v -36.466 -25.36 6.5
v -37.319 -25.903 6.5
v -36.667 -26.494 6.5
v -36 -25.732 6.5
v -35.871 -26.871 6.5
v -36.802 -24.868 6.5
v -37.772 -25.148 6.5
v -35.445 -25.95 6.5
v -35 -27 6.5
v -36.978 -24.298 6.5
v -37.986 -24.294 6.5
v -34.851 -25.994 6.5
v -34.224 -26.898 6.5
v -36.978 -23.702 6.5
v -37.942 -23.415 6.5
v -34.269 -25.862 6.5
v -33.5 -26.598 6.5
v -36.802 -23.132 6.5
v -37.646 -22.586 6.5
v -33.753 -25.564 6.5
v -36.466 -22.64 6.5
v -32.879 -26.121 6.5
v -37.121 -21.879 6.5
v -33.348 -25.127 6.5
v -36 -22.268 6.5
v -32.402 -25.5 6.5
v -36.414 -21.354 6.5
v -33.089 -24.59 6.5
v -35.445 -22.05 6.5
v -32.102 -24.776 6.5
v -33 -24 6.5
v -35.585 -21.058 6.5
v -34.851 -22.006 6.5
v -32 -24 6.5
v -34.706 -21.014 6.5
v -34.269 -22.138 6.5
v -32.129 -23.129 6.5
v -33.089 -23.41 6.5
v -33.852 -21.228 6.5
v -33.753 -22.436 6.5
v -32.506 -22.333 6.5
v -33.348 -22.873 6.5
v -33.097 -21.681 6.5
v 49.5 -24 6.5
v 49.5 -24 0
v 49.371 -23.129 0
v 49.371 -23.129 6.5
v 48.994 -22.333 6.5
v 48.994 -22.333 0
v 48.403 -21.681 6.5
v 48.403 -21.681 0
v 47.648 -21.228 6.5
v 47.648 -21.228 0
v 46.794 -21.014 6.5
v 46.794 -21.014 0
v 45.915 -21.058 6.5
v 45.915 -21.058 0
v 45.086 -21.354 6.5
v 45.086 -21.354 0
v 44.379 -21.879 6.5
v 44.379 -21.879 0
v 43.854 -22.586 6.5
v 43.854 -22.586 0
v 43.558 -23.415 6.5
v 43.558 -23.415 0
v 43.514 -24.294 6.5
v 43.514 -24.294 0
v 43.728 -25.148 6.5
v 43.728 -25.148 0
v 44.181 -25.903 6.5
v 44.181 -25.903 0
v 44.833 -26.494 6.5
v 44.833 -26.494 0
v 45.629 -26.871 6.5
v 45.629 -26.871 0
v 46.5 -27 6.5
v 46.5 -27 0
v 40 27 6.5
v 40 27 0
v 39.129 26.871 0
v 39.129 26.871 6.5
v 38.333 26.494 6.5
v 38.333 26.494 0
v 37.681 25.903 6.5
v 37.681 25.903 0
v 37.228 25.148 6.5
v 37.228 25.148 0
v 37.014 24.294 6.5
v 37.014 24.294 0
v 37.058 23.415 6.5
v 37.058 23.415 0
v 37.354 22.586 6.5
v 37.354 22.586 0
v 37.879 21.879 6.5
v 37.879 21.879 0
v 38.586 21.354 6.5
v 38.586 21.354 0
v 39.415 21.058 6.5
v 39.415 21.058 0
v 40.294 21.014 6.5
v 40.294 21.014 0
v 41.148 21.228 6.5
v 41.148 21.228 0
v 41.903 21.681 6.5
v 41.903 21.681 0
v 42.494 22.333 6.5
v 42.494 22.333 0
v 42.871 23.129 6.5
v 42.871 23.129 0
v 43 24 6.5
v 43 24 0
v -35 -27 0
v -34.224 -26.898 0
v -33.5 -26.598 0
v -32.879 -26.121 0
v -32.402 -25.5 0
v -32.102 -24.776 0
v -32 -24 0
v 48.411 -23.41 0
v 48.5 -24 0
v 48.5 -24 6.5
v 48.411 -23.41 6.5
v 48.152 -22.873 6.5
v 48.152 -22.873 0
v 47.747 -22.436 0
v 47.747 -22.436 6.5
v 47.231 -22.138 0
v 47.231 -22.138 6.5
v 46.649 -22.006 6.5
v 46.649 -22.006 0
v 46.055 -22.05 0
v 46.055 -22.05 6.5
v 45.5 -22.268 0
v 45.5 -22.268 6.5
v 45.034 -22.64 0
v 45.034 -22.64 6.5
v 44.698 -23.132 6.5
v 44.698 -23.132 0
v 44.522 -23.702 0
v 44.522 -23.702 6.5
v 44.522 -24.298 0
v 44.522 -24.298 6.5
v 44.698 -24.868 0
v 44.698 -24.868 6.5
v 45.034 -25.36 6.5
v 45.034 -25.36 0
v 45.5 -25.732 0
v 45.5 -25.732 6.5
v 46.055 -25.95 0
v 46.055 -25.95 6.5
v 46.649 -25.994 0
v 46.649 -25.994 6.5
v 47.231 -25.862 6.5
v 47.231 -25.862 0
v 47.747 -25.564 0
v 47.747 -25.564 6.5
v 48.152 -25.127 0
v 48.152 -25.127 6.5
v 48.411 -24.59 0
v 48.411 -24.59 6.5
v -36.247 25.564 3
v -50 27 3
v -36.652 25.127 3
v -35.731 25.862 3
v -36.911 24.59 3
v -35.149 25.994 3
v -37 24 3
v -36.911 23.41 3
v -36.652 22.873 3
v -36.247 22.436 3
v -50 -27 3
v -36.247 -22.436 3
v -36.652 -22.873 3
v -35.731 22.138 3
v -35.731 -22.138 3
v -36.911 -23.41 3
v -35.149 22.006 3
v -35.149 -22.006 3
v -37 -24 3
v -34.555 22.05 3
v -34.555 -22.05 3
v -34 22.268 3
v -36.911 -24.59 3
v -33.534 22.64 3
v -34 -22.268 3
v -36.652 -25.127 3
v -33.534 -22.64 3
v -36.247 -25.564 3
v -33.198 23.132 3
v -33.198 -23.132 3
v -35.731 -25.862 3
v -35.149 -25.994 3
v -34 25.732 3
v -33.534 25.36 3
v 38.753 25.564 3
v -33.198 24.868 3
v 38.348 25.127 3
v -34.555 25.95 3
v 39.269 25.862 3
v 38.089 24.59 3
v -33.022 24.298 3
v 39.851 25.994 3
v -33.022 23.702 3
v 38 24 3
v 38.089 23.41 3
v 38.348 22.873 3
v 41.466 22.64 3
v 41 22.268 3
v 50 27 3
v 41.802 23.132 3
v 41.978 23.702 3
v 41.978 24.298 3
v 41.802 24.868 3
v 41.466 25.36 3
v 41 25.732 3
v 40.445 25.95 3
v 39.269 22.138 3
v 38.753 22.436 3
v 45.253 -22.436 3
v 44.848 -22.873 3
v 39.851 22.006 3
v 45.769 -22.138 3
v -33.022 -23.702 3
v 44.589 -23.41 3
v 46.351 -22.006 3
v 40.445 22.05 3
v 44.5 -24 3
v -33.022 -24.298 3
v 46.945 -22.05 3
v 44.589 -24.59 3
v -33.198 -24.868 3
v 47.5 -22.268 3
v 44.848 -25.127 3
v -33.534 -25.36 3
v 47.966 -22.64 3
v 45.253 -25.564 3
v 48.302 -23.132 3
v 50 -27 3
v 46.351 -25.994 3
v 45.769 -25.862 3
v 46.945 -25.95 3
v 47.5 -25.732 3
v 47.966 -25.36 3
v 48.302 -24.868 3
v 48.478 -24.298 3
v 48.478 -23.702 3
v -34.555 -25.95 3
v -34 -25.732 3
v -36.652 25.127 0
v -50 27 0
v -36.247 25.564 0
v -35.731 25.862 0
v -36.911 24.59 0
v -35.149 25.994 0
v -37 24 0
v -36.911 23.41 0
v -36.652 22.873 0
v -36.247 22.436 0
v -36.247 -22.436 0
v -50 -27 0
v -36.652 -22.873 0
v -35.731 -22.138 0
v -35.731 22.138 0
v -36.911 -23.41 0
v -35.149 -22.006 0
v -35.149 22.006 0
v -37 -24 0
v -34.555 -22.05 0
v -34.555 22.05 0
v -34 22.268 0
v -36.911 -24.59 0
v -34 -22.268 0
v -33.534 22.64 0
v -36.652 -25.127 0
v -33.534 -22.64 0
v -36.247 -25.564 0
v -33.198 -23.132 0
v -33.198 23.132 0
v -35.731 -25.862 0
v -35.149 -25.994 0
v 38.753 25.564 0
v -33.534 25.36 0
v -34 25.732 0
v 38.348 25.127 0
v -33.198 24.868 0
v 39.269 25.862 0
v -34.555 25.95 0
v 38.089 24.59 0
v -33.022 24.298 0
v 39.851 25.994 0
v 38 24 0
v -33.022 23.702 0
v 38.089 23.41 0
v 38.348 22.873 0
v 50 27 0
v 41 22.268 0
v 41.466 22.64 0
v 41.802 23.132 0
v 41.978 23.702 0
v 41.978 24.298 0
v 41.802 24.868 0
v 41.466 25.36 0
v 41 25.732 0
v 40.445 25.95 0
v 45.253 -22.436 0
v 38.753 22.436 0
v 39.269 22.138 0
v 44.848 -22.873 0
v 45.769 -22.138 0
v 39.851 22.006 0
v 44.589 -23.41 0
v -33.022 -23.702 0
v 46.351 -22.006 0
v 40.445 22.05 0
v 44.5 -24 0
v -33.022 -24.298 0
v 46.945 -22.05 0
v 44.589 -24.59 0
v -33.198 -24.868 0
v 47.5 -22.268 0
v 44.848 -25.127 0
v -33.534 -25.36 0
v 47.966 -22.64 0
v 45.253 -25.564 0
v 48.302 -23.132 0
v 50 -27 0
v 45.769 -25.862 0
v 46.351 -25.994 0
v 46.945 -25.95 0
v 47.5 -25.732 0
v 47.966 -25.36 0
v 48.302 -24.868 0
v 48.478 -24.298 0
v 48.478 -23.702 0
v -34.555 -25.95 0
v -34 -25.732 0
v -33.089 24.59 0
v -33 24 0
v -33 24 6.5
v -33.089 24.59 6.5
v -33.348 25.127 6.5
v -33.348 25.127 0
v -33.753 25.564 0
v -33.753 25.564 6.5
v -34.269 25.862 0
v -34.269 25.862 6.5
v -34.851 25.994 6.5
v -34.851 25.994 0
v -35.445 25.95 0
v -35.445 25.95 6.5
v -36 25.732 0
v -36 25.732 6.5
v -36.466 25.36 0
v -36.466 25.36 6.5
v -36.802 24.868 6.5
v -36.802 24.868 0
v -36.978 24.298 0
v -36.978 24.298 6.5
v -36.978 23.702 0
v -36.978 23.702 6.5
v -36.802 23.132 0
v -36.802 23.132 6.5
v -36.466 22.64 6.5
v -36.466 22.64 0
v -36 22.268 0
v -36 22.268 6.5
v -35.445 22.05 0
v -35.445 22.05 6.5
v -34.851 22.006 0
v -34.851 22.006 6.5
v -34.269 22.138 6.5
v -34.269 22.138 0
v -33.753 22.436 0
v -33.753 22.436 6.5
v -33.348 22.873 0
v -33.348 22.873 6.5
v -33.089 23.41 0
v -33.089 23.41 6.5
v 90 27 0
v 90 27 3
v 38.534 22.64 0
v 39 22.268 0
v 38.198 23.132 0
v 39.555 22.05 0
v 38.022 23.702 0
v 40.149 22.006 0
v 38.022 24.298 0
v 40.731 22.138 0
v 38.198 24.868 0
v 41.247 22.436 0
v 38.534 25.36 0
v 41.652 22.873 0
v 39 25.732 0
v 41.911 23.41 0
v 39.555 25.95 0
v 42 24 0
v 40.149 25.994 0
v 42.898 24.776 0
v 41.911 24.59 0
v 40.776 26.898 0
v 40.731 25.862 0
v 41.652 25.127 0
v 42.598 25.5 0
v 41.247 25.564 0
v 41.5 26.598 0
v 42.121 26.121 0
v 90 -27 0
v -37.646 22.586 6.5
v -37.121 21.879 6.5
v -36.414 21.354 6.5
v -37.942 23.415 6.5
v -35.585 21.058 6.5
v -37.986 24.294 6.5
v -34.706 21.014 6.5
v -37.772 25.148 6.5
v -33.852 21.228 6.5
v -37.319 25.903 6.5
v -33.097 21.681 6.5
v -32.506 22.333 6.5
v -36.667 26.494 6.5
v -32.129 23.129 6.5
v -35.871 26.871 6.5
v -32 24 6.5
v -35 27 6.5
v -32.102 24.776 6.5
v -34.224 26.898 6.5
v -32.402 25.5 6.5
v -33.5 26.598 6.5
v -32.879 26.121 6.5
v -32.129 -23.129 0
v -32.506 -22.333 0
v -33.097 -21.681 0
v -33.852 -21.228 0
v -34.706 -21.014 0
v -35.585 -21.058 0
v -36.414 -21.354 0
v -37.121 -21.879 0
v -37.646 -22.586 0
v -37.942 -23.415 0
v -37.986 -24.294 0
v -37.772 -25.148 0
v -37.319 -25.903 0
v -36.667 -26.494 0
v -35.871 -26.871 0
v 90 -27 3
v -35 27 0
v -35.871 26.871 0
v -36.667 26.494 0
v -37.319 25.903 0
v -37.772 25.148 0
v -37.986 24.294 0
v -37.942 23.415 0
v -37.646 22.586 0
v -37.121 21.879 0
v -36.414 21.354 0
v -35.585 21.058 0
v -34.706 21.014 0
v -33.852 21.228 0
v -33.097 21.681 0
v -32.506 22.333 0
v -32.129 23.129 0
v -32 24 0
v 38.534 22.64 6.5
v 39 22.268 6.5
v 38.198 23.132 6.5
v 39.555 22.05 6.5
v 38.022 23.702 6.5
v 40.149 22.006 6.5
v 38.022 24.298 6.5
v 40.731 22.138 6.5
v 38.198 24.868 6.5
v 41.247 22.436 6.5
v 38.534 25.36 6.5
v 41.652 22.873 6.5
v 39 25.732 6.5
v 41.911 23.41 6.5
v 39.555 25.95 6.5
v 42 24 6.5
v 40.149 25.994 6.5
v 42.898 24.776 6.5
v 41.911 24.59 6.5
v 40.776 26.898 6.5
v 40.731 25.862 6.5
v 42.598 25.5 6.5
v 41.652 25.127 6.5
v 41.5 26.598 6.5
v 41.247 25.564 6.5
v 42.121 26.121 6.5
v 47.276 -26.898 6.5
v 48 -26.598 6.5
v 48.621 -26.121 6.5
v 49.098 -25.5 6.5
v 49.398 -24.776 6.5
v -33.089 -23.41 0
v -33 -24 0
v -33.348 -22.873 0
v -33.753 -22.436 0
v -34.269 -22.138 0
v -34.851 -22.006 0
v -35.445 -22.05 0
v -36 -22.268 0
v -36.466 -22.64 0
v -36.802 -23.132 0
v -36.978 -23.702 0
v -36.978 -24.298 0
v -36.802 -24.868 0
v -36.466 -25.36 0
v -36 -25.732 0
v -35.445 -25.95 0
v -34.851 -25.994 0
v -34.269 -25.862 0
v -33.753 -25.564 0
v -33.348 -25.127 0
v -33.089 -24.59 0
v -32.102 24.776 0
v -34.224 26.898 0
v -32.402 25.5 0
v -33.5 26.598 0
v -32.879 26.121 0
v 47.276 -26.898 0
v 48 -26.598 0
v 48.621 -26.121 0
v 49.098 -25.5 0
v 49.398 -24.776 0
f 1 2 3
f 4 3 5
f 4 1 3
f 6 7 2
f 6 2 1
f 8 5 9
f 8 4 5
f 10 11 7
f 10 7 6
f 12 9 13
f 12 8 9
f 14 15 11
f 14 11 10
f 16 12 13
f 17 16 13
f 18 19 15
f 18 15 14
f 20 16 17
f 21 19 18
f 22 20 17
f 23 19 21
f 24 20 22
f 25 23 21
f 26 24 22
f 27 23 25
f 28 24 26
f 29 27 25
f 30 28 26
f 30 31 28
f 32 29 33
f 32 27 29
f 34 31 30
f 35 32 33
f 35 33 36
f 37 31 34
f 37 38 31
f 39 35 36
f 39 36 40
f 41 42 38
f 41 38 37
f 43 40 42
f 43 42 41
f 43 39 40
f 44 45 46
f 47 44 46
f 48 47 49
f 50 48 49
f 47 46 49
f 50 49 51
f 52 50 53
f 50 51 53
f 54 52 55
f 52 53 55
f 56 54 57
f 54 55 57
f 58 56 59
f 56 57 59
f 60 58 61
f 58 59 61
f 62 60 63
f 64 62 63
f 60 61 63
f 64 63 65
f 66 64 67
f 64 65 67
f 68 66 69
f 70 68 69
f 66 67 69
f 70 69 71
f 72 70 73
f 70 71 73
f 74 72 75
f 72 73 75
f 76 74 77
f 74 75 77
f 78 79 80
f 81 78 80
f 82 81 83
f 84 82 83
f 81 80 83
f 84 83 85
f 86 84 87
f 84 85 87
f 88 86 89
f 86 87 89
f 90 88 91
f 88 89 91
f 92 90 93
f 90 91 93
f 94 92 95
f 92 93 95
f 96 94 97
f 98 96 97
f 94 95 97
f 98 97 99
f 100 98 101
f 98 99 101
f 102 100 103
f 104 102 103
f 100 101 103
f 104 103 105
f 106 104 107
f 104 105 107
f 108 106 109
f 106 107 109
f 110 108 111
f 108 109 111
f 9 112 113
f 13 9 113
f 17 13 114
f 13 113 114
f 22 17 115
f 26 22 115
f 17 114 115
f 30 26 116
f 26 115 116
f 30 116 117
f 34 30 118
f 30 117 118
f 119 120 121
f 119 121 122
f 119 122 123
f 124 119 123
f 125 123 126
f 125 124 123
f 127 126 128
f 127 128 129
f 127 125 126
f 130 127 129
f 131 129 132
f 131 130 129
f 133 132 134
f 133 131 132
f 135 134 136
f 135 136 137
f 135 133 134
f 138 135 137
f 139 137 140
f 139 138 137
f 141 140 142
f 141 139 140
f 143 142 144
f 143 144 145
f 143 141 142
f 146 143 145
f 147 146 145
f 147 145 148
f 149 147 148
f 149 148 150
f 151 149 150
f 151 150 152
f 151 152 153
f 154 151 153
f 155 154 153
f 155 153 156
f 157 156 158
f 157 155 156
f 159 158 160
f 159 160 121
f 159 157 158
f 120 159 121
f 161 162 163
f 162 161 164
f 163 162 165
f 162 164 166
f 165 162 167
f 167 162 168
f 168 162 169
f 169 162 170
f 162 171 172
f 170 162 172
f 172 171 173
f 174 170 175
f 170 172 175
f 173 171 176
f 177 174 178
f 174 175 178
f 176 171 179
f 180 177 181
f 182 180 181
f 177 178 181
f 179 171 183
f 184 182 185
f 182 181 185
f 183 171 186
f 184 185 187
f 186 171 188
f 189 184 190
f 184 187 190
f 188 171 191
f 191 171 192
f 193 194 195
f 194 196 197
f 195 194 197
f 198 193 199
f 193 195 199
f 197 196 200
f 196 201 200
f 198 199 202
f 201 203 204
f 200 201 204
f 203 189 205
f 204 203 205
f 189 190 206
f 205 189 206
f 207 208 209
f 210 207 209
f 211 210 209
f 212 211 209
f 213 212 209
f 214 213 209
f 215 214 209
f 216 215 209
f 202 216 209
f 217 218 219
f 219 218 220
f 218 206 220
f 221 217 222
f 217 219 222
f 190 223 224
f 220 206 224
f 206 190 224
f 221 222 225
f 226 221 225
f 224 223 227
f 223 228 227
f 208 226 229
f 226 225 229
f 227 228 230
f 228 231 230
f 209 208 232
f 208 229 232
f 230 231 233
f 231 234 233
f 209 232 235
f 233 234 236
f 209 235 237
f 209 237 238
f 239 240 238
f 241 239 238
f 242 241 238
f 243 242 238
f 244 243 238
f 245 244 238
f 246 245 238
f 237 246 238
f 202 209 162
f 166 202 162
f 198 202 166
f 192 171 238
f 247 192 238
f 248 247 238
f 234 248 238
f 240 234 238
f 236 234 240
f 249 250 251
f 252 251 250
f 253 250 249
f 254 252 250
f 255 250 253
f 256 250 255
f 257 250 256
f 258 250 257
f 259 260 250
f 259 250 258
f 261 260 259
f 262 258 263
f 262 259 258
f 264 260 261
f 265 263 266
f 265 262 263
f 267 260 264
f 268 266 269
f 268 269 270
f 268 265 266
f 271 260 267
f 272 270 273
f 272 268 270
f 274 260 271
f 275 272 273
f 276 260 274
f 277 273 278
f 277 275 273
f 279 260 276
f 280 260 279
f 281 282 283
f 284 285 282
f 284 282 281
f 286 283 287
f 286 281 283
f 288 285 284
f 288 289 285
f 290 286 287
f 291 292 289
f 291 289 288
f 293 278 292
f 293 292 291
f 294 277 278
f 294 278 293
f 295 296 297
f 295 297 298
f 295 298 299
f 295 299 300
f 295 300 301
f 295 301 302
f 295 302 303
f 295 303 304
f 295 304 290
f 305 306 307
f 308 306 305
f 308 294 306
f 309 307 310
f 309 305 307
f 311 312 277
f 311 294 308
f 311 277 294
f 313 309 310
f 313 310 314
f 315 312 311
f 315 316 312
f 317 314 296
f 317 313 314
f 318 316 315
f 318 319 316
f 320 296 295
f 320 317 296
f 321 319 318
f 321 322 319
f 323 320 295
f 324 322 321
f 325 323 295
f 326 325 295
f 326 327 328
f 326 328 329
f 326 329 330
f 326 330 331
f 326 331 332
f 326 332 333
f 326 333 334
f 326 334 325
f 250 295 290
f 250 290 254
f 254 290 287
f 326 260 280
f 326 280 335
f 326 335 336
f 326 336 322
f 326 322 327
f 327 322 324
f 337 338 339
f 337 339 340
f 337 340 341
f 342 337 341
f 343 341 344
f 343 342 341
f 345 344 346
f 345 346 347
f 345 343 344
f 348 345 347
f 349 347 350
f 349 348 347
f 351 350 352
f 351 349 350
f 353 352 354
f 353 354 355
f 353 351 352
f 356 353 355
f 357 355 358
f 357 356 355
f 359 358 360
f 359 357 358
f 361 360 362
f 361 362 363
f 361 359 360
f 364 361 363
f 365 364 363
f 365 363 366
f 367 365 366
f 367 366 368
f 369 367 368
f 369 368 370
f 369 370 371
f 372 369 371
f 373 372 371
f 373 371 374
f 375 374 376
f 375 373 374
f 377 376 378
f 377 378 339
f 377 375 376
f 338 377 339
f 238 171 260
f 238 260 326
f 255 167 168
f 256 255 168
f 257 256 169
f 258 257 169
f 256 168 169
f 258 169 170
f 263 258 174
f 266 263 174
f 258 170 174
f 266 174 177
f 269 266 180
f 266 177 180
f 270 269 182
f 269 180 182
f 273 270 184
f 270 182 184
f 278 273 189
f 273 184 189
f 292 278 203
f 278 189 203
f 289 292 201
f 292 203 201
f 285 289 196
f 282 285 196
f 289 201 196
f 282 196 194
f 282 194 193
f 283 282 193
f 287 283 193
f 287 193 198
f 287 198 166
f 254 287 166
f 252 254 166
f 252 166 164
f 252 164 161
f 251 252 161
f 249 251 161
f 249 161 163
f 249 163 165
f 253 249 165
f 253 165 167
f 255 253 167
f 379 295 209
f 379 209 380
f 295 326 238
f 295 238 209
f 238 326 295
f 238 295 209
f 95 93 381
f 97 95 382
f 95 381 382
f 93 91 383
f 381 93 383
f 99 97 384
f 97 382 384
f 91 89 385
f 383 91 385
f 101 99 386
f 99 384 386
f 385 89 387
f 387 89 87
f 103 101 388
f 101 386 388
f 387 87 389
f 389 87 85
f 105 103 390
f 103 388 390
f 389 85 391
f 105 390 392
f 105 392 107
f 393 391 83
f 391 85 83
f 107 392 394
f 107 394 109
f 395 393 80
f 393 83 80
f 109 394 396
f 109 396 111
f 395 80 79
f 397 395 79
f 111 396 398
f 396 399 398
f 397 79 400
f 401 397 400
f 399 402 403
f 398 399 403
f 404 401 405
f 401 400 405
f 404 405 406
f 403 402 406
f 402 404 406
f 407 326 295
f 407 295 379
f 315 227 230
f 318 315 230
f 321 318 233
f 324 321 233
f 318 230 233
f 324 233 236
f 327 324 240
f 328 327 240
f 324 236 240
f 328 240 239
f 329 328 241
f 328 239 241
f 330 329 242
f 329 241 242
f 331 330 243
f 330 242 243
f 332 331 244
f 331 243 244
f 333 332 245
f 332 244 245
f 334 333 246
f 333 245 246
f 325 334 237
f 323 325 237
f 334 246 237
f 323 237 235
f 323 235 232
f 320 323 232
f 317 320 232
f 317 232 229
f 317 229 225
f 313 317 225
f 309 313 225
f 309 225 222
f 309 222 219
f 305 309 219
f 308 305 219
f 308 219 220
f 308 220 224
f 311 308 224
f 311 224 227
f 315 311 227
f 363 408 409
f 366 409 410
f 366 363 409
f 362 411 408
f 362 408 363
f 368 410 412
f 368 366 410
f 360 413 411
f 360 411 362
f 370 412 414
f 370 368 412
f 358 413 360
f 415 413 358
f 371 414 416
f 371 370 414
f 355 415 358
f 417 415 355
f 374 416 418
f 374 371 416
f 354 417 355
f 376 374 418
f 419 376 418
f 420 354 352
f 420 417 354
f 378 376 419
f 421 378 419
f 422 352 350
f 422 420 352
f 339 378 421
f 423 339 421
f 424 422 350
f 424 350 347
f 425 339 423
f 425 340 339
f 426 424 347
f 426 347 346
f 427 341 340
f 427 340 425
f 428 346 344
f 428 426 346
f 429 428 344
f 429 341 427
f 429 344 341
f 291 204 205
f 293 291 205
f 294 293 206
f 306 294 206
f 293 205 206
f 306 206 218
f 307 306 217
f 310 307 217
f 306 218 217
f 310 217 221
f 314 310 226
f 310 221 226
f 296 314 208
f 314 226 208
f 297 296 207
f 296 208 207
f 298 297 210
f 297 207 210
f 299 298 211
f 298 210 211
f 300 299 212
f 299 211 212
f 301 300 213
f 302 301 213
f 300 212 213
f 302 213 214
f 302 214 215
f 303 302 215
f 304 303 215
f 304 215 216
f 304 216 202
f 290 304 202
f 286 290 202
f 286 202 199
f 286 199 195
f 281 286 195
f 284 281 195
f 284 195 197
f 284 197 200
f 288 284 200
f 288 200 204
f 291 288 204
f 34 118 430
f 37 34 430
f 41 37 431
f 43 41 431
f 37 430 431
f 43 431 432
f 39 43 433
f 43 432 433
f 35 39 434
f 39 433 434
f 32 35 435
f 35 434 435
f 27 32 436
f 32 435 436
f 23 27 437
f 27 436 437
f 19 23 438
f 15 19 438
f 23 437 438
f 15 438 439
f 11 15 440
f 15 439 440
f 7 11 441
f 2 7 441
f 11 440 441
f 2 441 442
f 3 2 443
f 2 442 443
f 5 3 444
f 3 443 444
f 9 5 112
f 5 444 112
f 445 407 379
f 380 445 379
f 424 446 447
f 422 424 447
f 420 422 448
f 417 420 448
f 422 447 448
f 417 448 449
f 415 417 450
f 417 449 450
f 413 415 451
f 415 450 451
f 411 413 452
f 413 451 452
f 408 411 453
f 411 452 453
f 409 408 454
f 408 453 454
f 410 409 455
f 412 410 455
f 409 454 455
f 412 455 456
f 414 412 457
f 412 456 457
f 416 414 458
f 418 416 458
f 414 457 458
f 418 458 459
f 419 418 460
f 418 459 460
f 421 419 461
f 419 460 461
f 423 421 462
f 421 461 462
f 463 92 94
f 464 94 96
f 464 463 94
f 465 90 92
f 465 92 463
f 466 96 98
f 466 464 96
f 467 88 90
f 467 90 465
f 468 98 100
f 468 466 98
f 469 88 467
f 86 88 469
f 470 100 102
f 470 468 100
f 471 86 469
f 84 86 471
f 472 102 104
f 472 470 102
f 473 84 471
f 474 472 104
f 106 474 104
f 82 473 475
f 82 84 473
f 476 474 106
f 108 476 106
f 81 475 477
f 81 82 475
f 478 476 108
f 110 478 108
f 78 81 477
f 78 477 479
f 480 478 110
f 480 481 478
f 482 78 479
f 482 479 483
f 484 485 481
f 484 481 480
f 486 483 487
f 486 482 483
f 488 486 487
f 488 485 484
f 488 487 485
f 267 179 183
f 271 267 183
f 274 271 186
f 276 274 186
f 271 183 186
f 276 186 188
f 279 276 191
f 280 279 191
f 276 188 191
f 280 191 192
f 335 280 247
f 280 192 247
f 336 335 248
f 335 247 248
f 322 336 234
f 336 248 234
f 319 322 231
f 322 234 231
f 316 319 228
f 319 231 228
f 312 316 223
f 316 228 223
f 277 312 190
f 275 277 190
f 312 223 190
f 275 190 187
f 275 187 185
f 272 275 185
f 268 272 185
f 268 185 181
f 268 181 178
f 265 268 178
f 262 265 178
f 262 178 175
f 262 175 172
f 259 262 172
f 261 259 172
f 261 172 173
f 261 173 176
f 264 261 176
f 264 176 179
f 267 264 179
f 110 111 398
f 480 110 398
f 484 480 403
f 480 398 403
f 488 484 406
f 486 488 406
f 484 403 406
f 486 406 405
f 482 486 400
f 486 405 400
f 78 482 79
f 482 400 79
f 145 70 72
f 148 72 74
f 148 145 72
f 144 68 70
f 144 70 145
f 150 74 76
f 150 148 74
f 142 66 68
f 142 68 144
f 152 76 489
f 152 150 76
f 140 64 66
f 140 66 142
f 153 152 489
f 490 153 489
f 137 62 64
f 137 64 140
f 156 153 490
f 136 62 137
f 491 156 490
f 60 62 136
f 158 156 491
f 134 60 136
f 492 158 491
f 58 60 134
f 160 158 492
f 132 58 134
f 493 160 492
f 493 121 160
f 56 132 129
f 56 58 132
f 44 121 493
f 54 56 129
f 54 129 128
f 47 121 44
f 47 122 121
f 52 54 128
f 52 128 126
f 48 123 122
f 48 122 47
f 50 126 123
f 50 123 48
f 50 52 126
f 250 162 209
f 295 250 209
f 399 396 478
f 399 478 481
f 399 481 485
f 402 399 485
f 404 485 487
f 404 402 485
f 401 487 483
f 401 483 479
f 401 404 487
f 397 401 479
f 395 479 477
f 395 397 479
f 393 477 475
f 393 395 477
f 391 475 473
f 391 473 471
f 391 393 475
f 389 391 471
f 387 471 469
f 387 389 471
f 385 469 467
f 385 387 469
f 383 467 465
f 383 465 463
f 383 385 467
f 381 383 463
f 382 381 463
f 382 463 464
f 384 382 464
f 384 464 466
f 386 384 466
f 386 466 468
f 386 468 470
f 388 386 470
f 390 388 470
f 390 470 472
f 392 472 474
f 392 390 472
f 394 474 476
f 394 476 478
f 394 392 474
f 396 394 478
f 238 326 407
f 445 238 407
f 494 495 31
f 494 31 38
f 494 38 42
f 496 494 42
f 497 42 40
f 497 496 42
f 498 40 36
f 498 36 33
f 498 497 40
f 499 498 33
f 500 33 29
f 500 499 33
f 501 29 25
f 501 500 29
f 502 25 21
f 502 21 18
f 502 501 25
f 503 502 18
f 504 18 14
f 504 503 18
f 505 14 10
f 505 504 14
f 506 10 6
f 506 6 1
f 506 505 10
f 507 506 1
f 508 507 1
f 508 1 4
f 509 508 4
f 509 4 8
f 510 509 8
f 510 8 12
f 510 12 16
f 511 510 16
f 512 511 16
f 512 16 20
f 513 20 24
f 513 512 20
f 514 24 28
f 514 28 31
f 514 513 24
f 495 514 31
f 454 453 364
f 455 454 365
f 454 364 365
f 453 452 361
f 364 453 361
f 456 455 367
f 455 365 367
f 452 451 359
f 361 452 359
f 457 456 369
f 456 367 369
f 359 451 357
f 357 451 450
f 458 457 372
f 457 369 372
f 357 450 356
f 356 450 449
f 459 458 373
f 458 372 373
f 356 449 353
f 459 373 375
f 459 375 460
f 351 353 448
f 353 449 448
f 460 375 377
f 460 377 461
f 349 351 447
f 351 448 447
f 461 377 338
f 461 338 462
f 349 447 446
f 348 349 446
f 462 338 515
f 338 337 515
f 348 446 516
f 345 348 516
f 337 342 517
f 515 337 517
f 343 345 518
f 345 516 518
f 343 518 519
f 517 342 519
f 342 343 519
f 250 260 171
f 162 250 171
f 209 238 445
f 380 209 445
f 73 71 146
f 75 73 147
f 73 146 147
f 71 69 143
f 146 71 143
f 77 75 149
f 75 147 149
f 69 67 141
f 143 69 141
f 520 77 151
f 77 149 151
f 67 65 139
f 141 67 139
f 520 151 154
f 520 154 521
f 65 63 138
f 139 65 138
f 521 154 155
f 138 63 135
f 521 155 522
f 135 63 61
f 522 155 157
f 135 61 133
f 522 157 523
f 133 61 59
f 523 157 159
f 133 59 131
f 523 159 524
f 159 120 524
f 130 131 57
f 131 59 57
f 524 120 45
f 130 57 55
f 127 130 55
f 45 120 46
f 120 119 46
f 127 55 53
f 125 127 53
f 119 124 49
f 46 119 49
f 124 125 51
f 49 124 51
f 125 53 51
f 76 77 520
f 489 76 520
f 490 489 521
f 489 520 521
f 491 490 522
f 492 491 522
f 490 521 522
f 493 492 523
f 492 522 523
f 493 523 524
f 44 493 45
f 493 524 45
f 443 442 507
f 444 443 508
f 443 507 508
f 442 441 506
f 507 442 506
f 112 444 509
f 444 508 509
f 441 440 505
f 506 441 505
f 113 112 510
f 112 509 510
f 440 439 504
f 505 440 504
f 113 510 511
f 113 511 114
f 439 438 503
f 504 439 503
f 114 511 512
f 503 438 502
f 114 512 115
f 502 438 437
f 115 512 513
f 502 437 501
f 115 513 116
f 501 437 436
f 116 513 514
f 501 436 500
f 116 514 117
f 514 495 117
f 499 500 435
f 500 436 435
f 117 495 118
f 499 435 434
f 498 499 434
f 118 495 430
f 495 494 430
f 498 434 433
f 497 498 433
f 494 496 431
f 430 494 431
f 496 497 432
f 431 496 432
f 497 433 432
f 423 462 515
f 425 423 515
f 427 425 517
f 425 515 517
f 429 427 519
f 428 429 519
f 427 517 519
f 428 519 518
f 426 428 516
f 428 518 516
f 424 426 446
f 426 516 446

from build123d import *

# Parameters (mm, degrees)
F0_R        = 2
F1_DEPTH    = 6.5
F0_W        = 40
F0_H        = 54
F2_DEPTH    = 3
F3_E0_TOP_W = 100
F3_E0_TOP_H = 3
F4_DEPTH    = 54
F5_D        = 4


with BuildPart() as f1:
    # F0 (on Top) → F1 (new body)
    with BuildSketch(Plane.XY):
        with BuildLine():
            ThreePointArc((-32, -24), (-37.1213203436, -21.8786796564), (-35, -27))
            ThreePointArc((-35, -27), (-32.8786796564, -26.1213203436), (-32, -24))
        make_face()
        with Locations((-35, -24)):
            Circle(F0_R, mode=Mode.SUBTRACT)
    extrude(amount=F1_DEPTH)


with BuildPart() as f1b:
    # F0 (on Top) → F1, piece 2 (new body)
    with BuildSketch(Plane.XY):
        with BuildLine():
            ThreePointArc((-32, 24), (-32.8786796564, 26.1213203436), (-35, 27))
            ThreePointArc((-35, 27), (-37.1213203436, 21.8786796564), (-32, 24))
        make_face()
        with Locations((-35, 24)):
            Circle(F0_R, mode=Mode.SUBTRACT)
    extrude(amount=F1_DEPTH)


with BuildPart() as f1c:
    # F0 (on Top) → F1, piece 3 (new body)
    with BuildSketch(Plane.XY):
        with BuildLine():
            ThreePointArc((43, 24), (42.1213203436, 26.1213203436), (40, 27))
            ThreePointArc((40, 27), (37.8786796564, 21.8786796564), (43, 24))
        make_face()
        with Locations((40, 24)):
            Circle(F0_R, mode=Mode.SUBTRACT)
    extrude(amount=F1_DEPTH)


with BuildPart() as f1d:
    # F0 (on Top) → F1, piece 4 (new body)
    with BuildSketch(Plane.XY):
        with BuildLine():
            ThreePointArc((49.5, -24), (44.3786796564, -21.8786796564), (46.5, -27))
            ThreePointArc((46.5, -27), (48.6213203436, -26.1213203436), (49.5, -24))
        make_face()
        with Locations((46.5, -24)):
            Circle(F0_R, mode=Mode.SUBTRACT)
    extrude(amount=F1_DEPTH)


with BuildPart() as f2:
    # F0 (on Top) → F2 (new body)
    with BuildSketch(Plane.XY):
        with Locations((70, 0)):
            Rectangle(F0_W, F0_H)
    extrude(amount=F2_DEPTH)


with BuildPart() as f4:
    # F3_E0_top (on explicit) → F4 (new body)
    with BuildSketch(Plane(origin=(-50, -27, 0), x_dir=(1, 0, 0), z_dir=(0, -1, 0))):
        with Locations((50, 1.5)):
            Rectangle(F3_E0_TOP_W, F3_E0_TOP_H)
    extrude(amount=-F4_DEPTH)

    # F5 (through all)
    with Locations(Plane(origin=(0, 0, 0), x_dir=(1, 0, 0), z_dir=(0, 0, -1))):
        with Locations((40, -24), (46.5, 24), (-35, 24), (-35, -24)):
            Hole(F5_D / 2)


solid = Compound([f1.part, f1b.part, f1c.part, f1d.part, f2.part, f4.part])
